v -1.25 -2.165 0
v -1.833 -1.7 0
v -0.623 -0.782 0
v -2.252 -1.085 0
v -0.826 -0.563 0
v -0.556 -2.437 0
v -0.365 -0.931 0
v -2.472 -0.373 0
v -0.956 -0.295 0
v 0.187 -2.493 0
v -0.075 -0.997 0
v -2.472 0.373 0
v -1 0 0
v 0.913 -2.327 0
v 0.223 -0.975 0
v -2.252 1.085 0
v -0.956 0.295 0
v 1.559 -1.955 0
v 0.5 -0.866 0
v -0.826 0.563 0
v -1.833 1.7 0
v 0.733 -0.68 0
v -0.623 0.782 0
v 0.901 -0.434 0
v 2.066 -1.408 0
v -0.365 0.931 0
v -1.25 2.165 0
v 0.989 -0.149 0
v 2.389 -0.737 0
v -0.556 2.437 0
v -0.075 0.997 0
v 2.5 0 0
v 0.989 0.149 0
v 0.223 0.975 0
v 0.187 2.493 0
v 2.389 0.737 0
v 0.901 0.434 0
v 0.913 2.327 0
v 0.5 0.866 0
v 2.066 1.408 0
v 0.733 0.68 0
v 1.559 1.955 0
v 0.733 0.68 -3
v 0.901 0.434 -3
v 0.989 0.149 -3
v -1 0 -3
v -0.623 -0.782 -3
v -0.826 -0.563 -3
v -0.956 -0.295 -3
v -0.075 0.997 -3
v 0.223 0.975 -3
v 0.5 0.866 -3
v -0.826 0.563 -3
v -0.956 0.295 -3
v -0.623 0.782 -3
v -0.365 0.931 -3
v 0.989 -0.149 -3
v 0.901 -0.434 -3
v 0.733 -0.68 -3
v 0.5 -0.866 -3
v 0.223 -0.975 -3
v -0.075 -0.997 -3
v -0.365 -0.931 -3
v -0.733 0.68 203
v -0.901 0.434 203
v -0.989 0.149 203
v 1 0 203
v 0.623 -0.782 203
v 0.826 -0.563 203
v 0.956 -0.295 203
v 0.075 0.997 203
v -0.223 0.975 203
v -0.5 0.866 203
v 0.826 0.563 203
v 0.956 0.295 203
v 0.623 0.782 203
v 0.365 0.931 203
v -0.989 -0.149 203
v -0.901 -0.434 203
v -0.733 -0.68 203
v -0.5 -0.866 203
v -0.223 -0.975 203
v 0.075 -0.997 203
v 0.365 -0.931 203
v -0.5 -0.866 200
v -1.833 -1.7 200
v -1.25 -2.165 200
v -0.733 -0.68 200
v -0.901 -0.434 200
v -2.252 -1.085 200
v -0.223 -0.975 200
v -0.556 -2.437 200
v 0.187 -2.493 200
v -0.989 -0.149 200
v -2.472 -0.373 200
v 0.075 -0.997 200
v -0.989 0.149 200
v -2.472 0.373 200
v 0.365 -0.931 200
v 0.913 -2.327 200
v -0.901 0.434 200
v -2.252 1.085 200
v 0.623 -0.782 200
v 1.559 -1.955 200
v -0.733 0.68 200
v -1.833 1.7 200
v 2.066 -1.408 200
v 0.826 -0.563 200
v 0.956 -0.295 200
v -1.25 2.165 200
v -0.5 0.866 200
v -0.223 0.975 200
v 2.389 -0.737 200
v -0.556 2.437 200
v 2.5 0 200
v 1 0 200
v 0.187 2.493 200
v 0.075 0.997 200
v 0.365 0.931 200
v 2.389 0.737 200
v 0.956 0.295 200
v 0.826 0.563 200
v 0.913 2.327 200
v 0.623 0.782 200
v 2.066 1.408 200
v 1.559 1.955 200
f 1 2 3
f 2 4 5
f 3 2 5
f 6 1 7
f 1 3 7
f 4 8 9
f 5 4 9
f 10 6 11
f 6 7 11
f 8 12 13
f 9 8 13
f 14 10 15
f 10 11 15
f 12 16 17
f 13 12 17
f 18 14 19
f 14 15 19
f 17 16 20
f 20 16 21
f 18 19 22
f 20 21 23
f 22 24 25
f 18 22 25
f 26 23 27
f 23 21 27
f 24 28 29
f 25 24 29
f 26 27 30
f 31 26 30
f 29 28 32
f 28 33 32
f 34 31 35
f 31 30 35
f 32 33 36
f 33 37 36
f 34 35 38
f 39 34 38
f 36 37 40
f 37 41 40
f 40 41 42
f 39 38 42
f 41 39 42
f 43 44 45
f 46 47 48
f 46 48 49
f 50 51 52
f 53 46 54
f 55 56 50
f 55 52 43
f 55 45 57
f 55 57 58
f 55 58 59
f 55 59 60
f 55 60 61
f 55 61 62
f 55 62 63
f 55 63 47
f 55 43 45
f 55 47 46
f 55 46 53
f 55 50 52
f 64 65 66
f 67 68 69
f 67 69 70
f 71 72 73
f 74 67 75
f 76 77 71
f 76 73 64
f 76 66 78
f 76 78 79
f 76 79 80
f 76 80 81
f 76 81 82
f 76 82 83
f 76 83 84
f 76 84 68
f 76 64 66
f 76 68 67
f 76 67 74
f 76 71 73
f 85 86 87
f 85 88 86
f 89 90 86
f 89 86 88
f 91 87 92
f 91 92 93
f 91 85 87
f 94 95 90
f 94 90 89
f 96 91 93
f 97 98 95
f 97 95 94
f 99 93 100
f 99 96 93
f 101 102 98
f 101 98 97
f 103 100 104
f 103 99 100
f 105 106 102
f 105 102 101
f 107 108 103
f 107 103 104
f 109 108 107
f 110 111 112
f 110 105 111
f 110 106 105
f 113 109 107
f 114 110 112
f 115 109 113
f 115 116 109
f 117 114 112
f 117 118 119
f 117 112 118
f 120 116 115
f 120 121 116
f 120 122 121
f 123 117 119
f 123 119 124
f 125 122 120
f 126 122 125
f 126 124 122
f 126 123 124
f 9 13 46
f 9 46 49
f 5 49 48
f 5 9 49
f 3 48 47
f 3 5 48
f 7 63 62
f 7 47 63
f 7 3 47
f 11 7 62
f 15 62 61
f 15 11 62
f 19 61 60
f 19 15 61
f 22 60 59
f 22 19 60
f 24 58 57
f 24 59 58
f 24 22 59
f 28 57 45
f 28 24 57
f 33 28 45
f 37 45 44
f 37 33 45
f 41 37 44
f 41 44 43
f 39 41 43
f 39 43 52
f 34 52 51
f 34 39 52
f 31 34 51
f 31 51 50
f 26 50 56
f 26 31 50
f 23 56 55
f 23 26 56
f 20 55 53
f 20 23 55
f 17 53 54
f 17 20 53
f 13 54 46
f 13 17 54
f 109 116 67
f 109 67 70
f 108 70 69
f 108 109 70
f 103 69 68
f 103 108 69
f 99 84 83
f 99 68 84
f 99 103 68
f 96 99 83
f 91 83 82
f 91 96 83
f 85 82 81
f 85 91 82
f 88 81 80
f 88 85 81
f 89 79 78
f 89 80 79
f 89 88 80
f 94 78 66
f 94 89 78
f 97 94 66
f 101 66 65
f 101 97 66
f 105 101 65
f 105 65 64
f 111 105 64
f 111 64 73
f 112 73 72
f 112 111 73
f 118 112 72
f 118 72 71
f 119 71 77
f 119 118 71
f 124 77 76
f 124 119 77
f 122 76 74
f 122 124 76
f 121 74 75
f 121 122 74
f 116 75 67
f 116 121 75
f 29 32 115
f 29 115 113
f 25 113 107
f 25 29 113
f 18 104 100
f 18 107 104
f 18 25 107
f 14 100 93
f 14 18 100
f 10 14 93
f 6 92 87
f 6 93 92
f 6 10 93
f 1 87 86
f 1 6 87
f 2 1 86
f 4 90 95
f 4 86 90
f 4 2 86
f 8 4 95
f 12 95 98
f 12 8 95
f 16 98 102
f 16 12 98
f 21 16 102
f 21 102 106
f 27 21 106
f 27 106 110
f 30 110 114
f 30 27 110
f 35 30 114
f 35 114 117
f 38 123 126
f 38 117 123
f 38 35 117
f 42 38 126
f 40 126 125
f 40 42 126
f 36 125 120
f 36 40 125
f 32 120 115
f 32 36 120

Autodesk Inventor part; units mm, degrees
ref_plane "YZ Plane" through (0, 0, 0) normal (1, 0, 0) x (0, 1, 0)
ref_plane "XZ Plane" through (0, 0, 0) normal (0, 1, 0) x (-1, 0, 0)
ref_plane "XY Plane" through (0, 0, 0) normal (0, 0, 1) x (1, 0, 0)
sketch "Sketch1" plane through (0, 0, 0) normal (0, 0, 1) x (1, 0, 0)
  circle A0 centre (0, 0) radius 2.5
  dimension "d0" = 5
extrude "Extrusion1" add sketch "Sketch1" along normal blind 200
sketch "Sketch2" plane through (0, 0, 200) normal (0, 0, 1) x (1, 0, 0)
  circle A0 centre (0, 0) radius 2.5 projected
  circle A1 centre (0, 0) radius 1
  dimension "d3" = 2
extrude "Extrusion2" add sketch "Sketch2" along normal blind 3 contours A1
sketch "Sketch3" plane through (0, 0, 0) normal (0, 0, -1) x (-1, 0, 0)
  circle A0 centre (0, 0) radius 1
  dimension "d6" = 2
extrude "Extrusion3" add sketch "Sketch3" along normal blind 3
properties part number "Bone-20cm"
